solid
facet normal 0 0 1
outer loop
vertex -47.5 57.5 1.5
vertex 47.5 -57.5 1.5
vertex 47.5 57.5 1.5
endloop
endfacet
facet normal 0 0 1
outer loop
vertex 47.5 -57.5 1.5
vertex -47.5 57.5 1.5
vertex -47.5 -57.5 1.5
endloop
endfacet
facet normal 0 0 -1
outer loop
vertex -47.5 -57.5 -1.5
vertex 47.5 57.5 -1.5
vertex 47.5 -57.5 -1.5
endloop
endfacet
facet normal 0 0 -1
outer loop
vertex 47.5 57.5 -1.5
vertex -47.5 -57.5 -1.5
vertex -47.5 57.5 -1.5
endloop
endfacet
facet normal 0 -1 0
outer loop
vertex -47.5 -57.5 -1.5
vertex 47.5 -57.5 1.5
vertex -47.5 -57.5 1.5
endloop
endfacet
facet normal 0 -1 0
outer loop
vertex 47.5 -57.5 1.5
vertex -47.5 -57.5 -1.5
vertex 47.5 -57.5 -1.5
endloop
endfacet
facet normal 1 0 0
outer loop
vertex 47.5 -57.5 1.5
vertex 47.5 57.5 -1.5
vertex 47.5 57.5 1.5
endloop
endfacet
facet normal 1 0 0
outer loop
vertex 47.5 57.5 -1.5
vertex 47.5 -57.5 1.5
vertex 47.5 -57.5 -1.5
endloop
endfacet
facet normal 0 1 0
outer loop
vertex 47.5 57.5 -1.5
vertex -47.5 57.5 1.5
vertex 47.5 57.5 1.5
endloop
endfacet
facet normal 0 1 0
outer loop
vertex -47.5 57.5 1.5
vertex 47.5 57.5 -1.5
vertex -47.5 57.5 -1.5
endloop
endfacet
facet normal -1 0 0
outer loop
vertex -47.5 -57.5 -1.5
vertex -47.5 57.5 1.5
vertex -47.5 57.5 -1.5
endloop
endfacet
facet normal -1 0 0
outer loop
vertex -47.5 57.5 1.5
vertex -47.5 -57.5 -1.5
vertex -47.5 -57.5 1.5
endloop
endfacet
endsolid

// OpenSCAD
// ========================================
// a 95 x 115 x 3 mm plate
// NeuroCAD canonical IR; dimensions are millimetres
// ========================================
$fn = 48;

cube(size=[95, 115, 3], center=true);
